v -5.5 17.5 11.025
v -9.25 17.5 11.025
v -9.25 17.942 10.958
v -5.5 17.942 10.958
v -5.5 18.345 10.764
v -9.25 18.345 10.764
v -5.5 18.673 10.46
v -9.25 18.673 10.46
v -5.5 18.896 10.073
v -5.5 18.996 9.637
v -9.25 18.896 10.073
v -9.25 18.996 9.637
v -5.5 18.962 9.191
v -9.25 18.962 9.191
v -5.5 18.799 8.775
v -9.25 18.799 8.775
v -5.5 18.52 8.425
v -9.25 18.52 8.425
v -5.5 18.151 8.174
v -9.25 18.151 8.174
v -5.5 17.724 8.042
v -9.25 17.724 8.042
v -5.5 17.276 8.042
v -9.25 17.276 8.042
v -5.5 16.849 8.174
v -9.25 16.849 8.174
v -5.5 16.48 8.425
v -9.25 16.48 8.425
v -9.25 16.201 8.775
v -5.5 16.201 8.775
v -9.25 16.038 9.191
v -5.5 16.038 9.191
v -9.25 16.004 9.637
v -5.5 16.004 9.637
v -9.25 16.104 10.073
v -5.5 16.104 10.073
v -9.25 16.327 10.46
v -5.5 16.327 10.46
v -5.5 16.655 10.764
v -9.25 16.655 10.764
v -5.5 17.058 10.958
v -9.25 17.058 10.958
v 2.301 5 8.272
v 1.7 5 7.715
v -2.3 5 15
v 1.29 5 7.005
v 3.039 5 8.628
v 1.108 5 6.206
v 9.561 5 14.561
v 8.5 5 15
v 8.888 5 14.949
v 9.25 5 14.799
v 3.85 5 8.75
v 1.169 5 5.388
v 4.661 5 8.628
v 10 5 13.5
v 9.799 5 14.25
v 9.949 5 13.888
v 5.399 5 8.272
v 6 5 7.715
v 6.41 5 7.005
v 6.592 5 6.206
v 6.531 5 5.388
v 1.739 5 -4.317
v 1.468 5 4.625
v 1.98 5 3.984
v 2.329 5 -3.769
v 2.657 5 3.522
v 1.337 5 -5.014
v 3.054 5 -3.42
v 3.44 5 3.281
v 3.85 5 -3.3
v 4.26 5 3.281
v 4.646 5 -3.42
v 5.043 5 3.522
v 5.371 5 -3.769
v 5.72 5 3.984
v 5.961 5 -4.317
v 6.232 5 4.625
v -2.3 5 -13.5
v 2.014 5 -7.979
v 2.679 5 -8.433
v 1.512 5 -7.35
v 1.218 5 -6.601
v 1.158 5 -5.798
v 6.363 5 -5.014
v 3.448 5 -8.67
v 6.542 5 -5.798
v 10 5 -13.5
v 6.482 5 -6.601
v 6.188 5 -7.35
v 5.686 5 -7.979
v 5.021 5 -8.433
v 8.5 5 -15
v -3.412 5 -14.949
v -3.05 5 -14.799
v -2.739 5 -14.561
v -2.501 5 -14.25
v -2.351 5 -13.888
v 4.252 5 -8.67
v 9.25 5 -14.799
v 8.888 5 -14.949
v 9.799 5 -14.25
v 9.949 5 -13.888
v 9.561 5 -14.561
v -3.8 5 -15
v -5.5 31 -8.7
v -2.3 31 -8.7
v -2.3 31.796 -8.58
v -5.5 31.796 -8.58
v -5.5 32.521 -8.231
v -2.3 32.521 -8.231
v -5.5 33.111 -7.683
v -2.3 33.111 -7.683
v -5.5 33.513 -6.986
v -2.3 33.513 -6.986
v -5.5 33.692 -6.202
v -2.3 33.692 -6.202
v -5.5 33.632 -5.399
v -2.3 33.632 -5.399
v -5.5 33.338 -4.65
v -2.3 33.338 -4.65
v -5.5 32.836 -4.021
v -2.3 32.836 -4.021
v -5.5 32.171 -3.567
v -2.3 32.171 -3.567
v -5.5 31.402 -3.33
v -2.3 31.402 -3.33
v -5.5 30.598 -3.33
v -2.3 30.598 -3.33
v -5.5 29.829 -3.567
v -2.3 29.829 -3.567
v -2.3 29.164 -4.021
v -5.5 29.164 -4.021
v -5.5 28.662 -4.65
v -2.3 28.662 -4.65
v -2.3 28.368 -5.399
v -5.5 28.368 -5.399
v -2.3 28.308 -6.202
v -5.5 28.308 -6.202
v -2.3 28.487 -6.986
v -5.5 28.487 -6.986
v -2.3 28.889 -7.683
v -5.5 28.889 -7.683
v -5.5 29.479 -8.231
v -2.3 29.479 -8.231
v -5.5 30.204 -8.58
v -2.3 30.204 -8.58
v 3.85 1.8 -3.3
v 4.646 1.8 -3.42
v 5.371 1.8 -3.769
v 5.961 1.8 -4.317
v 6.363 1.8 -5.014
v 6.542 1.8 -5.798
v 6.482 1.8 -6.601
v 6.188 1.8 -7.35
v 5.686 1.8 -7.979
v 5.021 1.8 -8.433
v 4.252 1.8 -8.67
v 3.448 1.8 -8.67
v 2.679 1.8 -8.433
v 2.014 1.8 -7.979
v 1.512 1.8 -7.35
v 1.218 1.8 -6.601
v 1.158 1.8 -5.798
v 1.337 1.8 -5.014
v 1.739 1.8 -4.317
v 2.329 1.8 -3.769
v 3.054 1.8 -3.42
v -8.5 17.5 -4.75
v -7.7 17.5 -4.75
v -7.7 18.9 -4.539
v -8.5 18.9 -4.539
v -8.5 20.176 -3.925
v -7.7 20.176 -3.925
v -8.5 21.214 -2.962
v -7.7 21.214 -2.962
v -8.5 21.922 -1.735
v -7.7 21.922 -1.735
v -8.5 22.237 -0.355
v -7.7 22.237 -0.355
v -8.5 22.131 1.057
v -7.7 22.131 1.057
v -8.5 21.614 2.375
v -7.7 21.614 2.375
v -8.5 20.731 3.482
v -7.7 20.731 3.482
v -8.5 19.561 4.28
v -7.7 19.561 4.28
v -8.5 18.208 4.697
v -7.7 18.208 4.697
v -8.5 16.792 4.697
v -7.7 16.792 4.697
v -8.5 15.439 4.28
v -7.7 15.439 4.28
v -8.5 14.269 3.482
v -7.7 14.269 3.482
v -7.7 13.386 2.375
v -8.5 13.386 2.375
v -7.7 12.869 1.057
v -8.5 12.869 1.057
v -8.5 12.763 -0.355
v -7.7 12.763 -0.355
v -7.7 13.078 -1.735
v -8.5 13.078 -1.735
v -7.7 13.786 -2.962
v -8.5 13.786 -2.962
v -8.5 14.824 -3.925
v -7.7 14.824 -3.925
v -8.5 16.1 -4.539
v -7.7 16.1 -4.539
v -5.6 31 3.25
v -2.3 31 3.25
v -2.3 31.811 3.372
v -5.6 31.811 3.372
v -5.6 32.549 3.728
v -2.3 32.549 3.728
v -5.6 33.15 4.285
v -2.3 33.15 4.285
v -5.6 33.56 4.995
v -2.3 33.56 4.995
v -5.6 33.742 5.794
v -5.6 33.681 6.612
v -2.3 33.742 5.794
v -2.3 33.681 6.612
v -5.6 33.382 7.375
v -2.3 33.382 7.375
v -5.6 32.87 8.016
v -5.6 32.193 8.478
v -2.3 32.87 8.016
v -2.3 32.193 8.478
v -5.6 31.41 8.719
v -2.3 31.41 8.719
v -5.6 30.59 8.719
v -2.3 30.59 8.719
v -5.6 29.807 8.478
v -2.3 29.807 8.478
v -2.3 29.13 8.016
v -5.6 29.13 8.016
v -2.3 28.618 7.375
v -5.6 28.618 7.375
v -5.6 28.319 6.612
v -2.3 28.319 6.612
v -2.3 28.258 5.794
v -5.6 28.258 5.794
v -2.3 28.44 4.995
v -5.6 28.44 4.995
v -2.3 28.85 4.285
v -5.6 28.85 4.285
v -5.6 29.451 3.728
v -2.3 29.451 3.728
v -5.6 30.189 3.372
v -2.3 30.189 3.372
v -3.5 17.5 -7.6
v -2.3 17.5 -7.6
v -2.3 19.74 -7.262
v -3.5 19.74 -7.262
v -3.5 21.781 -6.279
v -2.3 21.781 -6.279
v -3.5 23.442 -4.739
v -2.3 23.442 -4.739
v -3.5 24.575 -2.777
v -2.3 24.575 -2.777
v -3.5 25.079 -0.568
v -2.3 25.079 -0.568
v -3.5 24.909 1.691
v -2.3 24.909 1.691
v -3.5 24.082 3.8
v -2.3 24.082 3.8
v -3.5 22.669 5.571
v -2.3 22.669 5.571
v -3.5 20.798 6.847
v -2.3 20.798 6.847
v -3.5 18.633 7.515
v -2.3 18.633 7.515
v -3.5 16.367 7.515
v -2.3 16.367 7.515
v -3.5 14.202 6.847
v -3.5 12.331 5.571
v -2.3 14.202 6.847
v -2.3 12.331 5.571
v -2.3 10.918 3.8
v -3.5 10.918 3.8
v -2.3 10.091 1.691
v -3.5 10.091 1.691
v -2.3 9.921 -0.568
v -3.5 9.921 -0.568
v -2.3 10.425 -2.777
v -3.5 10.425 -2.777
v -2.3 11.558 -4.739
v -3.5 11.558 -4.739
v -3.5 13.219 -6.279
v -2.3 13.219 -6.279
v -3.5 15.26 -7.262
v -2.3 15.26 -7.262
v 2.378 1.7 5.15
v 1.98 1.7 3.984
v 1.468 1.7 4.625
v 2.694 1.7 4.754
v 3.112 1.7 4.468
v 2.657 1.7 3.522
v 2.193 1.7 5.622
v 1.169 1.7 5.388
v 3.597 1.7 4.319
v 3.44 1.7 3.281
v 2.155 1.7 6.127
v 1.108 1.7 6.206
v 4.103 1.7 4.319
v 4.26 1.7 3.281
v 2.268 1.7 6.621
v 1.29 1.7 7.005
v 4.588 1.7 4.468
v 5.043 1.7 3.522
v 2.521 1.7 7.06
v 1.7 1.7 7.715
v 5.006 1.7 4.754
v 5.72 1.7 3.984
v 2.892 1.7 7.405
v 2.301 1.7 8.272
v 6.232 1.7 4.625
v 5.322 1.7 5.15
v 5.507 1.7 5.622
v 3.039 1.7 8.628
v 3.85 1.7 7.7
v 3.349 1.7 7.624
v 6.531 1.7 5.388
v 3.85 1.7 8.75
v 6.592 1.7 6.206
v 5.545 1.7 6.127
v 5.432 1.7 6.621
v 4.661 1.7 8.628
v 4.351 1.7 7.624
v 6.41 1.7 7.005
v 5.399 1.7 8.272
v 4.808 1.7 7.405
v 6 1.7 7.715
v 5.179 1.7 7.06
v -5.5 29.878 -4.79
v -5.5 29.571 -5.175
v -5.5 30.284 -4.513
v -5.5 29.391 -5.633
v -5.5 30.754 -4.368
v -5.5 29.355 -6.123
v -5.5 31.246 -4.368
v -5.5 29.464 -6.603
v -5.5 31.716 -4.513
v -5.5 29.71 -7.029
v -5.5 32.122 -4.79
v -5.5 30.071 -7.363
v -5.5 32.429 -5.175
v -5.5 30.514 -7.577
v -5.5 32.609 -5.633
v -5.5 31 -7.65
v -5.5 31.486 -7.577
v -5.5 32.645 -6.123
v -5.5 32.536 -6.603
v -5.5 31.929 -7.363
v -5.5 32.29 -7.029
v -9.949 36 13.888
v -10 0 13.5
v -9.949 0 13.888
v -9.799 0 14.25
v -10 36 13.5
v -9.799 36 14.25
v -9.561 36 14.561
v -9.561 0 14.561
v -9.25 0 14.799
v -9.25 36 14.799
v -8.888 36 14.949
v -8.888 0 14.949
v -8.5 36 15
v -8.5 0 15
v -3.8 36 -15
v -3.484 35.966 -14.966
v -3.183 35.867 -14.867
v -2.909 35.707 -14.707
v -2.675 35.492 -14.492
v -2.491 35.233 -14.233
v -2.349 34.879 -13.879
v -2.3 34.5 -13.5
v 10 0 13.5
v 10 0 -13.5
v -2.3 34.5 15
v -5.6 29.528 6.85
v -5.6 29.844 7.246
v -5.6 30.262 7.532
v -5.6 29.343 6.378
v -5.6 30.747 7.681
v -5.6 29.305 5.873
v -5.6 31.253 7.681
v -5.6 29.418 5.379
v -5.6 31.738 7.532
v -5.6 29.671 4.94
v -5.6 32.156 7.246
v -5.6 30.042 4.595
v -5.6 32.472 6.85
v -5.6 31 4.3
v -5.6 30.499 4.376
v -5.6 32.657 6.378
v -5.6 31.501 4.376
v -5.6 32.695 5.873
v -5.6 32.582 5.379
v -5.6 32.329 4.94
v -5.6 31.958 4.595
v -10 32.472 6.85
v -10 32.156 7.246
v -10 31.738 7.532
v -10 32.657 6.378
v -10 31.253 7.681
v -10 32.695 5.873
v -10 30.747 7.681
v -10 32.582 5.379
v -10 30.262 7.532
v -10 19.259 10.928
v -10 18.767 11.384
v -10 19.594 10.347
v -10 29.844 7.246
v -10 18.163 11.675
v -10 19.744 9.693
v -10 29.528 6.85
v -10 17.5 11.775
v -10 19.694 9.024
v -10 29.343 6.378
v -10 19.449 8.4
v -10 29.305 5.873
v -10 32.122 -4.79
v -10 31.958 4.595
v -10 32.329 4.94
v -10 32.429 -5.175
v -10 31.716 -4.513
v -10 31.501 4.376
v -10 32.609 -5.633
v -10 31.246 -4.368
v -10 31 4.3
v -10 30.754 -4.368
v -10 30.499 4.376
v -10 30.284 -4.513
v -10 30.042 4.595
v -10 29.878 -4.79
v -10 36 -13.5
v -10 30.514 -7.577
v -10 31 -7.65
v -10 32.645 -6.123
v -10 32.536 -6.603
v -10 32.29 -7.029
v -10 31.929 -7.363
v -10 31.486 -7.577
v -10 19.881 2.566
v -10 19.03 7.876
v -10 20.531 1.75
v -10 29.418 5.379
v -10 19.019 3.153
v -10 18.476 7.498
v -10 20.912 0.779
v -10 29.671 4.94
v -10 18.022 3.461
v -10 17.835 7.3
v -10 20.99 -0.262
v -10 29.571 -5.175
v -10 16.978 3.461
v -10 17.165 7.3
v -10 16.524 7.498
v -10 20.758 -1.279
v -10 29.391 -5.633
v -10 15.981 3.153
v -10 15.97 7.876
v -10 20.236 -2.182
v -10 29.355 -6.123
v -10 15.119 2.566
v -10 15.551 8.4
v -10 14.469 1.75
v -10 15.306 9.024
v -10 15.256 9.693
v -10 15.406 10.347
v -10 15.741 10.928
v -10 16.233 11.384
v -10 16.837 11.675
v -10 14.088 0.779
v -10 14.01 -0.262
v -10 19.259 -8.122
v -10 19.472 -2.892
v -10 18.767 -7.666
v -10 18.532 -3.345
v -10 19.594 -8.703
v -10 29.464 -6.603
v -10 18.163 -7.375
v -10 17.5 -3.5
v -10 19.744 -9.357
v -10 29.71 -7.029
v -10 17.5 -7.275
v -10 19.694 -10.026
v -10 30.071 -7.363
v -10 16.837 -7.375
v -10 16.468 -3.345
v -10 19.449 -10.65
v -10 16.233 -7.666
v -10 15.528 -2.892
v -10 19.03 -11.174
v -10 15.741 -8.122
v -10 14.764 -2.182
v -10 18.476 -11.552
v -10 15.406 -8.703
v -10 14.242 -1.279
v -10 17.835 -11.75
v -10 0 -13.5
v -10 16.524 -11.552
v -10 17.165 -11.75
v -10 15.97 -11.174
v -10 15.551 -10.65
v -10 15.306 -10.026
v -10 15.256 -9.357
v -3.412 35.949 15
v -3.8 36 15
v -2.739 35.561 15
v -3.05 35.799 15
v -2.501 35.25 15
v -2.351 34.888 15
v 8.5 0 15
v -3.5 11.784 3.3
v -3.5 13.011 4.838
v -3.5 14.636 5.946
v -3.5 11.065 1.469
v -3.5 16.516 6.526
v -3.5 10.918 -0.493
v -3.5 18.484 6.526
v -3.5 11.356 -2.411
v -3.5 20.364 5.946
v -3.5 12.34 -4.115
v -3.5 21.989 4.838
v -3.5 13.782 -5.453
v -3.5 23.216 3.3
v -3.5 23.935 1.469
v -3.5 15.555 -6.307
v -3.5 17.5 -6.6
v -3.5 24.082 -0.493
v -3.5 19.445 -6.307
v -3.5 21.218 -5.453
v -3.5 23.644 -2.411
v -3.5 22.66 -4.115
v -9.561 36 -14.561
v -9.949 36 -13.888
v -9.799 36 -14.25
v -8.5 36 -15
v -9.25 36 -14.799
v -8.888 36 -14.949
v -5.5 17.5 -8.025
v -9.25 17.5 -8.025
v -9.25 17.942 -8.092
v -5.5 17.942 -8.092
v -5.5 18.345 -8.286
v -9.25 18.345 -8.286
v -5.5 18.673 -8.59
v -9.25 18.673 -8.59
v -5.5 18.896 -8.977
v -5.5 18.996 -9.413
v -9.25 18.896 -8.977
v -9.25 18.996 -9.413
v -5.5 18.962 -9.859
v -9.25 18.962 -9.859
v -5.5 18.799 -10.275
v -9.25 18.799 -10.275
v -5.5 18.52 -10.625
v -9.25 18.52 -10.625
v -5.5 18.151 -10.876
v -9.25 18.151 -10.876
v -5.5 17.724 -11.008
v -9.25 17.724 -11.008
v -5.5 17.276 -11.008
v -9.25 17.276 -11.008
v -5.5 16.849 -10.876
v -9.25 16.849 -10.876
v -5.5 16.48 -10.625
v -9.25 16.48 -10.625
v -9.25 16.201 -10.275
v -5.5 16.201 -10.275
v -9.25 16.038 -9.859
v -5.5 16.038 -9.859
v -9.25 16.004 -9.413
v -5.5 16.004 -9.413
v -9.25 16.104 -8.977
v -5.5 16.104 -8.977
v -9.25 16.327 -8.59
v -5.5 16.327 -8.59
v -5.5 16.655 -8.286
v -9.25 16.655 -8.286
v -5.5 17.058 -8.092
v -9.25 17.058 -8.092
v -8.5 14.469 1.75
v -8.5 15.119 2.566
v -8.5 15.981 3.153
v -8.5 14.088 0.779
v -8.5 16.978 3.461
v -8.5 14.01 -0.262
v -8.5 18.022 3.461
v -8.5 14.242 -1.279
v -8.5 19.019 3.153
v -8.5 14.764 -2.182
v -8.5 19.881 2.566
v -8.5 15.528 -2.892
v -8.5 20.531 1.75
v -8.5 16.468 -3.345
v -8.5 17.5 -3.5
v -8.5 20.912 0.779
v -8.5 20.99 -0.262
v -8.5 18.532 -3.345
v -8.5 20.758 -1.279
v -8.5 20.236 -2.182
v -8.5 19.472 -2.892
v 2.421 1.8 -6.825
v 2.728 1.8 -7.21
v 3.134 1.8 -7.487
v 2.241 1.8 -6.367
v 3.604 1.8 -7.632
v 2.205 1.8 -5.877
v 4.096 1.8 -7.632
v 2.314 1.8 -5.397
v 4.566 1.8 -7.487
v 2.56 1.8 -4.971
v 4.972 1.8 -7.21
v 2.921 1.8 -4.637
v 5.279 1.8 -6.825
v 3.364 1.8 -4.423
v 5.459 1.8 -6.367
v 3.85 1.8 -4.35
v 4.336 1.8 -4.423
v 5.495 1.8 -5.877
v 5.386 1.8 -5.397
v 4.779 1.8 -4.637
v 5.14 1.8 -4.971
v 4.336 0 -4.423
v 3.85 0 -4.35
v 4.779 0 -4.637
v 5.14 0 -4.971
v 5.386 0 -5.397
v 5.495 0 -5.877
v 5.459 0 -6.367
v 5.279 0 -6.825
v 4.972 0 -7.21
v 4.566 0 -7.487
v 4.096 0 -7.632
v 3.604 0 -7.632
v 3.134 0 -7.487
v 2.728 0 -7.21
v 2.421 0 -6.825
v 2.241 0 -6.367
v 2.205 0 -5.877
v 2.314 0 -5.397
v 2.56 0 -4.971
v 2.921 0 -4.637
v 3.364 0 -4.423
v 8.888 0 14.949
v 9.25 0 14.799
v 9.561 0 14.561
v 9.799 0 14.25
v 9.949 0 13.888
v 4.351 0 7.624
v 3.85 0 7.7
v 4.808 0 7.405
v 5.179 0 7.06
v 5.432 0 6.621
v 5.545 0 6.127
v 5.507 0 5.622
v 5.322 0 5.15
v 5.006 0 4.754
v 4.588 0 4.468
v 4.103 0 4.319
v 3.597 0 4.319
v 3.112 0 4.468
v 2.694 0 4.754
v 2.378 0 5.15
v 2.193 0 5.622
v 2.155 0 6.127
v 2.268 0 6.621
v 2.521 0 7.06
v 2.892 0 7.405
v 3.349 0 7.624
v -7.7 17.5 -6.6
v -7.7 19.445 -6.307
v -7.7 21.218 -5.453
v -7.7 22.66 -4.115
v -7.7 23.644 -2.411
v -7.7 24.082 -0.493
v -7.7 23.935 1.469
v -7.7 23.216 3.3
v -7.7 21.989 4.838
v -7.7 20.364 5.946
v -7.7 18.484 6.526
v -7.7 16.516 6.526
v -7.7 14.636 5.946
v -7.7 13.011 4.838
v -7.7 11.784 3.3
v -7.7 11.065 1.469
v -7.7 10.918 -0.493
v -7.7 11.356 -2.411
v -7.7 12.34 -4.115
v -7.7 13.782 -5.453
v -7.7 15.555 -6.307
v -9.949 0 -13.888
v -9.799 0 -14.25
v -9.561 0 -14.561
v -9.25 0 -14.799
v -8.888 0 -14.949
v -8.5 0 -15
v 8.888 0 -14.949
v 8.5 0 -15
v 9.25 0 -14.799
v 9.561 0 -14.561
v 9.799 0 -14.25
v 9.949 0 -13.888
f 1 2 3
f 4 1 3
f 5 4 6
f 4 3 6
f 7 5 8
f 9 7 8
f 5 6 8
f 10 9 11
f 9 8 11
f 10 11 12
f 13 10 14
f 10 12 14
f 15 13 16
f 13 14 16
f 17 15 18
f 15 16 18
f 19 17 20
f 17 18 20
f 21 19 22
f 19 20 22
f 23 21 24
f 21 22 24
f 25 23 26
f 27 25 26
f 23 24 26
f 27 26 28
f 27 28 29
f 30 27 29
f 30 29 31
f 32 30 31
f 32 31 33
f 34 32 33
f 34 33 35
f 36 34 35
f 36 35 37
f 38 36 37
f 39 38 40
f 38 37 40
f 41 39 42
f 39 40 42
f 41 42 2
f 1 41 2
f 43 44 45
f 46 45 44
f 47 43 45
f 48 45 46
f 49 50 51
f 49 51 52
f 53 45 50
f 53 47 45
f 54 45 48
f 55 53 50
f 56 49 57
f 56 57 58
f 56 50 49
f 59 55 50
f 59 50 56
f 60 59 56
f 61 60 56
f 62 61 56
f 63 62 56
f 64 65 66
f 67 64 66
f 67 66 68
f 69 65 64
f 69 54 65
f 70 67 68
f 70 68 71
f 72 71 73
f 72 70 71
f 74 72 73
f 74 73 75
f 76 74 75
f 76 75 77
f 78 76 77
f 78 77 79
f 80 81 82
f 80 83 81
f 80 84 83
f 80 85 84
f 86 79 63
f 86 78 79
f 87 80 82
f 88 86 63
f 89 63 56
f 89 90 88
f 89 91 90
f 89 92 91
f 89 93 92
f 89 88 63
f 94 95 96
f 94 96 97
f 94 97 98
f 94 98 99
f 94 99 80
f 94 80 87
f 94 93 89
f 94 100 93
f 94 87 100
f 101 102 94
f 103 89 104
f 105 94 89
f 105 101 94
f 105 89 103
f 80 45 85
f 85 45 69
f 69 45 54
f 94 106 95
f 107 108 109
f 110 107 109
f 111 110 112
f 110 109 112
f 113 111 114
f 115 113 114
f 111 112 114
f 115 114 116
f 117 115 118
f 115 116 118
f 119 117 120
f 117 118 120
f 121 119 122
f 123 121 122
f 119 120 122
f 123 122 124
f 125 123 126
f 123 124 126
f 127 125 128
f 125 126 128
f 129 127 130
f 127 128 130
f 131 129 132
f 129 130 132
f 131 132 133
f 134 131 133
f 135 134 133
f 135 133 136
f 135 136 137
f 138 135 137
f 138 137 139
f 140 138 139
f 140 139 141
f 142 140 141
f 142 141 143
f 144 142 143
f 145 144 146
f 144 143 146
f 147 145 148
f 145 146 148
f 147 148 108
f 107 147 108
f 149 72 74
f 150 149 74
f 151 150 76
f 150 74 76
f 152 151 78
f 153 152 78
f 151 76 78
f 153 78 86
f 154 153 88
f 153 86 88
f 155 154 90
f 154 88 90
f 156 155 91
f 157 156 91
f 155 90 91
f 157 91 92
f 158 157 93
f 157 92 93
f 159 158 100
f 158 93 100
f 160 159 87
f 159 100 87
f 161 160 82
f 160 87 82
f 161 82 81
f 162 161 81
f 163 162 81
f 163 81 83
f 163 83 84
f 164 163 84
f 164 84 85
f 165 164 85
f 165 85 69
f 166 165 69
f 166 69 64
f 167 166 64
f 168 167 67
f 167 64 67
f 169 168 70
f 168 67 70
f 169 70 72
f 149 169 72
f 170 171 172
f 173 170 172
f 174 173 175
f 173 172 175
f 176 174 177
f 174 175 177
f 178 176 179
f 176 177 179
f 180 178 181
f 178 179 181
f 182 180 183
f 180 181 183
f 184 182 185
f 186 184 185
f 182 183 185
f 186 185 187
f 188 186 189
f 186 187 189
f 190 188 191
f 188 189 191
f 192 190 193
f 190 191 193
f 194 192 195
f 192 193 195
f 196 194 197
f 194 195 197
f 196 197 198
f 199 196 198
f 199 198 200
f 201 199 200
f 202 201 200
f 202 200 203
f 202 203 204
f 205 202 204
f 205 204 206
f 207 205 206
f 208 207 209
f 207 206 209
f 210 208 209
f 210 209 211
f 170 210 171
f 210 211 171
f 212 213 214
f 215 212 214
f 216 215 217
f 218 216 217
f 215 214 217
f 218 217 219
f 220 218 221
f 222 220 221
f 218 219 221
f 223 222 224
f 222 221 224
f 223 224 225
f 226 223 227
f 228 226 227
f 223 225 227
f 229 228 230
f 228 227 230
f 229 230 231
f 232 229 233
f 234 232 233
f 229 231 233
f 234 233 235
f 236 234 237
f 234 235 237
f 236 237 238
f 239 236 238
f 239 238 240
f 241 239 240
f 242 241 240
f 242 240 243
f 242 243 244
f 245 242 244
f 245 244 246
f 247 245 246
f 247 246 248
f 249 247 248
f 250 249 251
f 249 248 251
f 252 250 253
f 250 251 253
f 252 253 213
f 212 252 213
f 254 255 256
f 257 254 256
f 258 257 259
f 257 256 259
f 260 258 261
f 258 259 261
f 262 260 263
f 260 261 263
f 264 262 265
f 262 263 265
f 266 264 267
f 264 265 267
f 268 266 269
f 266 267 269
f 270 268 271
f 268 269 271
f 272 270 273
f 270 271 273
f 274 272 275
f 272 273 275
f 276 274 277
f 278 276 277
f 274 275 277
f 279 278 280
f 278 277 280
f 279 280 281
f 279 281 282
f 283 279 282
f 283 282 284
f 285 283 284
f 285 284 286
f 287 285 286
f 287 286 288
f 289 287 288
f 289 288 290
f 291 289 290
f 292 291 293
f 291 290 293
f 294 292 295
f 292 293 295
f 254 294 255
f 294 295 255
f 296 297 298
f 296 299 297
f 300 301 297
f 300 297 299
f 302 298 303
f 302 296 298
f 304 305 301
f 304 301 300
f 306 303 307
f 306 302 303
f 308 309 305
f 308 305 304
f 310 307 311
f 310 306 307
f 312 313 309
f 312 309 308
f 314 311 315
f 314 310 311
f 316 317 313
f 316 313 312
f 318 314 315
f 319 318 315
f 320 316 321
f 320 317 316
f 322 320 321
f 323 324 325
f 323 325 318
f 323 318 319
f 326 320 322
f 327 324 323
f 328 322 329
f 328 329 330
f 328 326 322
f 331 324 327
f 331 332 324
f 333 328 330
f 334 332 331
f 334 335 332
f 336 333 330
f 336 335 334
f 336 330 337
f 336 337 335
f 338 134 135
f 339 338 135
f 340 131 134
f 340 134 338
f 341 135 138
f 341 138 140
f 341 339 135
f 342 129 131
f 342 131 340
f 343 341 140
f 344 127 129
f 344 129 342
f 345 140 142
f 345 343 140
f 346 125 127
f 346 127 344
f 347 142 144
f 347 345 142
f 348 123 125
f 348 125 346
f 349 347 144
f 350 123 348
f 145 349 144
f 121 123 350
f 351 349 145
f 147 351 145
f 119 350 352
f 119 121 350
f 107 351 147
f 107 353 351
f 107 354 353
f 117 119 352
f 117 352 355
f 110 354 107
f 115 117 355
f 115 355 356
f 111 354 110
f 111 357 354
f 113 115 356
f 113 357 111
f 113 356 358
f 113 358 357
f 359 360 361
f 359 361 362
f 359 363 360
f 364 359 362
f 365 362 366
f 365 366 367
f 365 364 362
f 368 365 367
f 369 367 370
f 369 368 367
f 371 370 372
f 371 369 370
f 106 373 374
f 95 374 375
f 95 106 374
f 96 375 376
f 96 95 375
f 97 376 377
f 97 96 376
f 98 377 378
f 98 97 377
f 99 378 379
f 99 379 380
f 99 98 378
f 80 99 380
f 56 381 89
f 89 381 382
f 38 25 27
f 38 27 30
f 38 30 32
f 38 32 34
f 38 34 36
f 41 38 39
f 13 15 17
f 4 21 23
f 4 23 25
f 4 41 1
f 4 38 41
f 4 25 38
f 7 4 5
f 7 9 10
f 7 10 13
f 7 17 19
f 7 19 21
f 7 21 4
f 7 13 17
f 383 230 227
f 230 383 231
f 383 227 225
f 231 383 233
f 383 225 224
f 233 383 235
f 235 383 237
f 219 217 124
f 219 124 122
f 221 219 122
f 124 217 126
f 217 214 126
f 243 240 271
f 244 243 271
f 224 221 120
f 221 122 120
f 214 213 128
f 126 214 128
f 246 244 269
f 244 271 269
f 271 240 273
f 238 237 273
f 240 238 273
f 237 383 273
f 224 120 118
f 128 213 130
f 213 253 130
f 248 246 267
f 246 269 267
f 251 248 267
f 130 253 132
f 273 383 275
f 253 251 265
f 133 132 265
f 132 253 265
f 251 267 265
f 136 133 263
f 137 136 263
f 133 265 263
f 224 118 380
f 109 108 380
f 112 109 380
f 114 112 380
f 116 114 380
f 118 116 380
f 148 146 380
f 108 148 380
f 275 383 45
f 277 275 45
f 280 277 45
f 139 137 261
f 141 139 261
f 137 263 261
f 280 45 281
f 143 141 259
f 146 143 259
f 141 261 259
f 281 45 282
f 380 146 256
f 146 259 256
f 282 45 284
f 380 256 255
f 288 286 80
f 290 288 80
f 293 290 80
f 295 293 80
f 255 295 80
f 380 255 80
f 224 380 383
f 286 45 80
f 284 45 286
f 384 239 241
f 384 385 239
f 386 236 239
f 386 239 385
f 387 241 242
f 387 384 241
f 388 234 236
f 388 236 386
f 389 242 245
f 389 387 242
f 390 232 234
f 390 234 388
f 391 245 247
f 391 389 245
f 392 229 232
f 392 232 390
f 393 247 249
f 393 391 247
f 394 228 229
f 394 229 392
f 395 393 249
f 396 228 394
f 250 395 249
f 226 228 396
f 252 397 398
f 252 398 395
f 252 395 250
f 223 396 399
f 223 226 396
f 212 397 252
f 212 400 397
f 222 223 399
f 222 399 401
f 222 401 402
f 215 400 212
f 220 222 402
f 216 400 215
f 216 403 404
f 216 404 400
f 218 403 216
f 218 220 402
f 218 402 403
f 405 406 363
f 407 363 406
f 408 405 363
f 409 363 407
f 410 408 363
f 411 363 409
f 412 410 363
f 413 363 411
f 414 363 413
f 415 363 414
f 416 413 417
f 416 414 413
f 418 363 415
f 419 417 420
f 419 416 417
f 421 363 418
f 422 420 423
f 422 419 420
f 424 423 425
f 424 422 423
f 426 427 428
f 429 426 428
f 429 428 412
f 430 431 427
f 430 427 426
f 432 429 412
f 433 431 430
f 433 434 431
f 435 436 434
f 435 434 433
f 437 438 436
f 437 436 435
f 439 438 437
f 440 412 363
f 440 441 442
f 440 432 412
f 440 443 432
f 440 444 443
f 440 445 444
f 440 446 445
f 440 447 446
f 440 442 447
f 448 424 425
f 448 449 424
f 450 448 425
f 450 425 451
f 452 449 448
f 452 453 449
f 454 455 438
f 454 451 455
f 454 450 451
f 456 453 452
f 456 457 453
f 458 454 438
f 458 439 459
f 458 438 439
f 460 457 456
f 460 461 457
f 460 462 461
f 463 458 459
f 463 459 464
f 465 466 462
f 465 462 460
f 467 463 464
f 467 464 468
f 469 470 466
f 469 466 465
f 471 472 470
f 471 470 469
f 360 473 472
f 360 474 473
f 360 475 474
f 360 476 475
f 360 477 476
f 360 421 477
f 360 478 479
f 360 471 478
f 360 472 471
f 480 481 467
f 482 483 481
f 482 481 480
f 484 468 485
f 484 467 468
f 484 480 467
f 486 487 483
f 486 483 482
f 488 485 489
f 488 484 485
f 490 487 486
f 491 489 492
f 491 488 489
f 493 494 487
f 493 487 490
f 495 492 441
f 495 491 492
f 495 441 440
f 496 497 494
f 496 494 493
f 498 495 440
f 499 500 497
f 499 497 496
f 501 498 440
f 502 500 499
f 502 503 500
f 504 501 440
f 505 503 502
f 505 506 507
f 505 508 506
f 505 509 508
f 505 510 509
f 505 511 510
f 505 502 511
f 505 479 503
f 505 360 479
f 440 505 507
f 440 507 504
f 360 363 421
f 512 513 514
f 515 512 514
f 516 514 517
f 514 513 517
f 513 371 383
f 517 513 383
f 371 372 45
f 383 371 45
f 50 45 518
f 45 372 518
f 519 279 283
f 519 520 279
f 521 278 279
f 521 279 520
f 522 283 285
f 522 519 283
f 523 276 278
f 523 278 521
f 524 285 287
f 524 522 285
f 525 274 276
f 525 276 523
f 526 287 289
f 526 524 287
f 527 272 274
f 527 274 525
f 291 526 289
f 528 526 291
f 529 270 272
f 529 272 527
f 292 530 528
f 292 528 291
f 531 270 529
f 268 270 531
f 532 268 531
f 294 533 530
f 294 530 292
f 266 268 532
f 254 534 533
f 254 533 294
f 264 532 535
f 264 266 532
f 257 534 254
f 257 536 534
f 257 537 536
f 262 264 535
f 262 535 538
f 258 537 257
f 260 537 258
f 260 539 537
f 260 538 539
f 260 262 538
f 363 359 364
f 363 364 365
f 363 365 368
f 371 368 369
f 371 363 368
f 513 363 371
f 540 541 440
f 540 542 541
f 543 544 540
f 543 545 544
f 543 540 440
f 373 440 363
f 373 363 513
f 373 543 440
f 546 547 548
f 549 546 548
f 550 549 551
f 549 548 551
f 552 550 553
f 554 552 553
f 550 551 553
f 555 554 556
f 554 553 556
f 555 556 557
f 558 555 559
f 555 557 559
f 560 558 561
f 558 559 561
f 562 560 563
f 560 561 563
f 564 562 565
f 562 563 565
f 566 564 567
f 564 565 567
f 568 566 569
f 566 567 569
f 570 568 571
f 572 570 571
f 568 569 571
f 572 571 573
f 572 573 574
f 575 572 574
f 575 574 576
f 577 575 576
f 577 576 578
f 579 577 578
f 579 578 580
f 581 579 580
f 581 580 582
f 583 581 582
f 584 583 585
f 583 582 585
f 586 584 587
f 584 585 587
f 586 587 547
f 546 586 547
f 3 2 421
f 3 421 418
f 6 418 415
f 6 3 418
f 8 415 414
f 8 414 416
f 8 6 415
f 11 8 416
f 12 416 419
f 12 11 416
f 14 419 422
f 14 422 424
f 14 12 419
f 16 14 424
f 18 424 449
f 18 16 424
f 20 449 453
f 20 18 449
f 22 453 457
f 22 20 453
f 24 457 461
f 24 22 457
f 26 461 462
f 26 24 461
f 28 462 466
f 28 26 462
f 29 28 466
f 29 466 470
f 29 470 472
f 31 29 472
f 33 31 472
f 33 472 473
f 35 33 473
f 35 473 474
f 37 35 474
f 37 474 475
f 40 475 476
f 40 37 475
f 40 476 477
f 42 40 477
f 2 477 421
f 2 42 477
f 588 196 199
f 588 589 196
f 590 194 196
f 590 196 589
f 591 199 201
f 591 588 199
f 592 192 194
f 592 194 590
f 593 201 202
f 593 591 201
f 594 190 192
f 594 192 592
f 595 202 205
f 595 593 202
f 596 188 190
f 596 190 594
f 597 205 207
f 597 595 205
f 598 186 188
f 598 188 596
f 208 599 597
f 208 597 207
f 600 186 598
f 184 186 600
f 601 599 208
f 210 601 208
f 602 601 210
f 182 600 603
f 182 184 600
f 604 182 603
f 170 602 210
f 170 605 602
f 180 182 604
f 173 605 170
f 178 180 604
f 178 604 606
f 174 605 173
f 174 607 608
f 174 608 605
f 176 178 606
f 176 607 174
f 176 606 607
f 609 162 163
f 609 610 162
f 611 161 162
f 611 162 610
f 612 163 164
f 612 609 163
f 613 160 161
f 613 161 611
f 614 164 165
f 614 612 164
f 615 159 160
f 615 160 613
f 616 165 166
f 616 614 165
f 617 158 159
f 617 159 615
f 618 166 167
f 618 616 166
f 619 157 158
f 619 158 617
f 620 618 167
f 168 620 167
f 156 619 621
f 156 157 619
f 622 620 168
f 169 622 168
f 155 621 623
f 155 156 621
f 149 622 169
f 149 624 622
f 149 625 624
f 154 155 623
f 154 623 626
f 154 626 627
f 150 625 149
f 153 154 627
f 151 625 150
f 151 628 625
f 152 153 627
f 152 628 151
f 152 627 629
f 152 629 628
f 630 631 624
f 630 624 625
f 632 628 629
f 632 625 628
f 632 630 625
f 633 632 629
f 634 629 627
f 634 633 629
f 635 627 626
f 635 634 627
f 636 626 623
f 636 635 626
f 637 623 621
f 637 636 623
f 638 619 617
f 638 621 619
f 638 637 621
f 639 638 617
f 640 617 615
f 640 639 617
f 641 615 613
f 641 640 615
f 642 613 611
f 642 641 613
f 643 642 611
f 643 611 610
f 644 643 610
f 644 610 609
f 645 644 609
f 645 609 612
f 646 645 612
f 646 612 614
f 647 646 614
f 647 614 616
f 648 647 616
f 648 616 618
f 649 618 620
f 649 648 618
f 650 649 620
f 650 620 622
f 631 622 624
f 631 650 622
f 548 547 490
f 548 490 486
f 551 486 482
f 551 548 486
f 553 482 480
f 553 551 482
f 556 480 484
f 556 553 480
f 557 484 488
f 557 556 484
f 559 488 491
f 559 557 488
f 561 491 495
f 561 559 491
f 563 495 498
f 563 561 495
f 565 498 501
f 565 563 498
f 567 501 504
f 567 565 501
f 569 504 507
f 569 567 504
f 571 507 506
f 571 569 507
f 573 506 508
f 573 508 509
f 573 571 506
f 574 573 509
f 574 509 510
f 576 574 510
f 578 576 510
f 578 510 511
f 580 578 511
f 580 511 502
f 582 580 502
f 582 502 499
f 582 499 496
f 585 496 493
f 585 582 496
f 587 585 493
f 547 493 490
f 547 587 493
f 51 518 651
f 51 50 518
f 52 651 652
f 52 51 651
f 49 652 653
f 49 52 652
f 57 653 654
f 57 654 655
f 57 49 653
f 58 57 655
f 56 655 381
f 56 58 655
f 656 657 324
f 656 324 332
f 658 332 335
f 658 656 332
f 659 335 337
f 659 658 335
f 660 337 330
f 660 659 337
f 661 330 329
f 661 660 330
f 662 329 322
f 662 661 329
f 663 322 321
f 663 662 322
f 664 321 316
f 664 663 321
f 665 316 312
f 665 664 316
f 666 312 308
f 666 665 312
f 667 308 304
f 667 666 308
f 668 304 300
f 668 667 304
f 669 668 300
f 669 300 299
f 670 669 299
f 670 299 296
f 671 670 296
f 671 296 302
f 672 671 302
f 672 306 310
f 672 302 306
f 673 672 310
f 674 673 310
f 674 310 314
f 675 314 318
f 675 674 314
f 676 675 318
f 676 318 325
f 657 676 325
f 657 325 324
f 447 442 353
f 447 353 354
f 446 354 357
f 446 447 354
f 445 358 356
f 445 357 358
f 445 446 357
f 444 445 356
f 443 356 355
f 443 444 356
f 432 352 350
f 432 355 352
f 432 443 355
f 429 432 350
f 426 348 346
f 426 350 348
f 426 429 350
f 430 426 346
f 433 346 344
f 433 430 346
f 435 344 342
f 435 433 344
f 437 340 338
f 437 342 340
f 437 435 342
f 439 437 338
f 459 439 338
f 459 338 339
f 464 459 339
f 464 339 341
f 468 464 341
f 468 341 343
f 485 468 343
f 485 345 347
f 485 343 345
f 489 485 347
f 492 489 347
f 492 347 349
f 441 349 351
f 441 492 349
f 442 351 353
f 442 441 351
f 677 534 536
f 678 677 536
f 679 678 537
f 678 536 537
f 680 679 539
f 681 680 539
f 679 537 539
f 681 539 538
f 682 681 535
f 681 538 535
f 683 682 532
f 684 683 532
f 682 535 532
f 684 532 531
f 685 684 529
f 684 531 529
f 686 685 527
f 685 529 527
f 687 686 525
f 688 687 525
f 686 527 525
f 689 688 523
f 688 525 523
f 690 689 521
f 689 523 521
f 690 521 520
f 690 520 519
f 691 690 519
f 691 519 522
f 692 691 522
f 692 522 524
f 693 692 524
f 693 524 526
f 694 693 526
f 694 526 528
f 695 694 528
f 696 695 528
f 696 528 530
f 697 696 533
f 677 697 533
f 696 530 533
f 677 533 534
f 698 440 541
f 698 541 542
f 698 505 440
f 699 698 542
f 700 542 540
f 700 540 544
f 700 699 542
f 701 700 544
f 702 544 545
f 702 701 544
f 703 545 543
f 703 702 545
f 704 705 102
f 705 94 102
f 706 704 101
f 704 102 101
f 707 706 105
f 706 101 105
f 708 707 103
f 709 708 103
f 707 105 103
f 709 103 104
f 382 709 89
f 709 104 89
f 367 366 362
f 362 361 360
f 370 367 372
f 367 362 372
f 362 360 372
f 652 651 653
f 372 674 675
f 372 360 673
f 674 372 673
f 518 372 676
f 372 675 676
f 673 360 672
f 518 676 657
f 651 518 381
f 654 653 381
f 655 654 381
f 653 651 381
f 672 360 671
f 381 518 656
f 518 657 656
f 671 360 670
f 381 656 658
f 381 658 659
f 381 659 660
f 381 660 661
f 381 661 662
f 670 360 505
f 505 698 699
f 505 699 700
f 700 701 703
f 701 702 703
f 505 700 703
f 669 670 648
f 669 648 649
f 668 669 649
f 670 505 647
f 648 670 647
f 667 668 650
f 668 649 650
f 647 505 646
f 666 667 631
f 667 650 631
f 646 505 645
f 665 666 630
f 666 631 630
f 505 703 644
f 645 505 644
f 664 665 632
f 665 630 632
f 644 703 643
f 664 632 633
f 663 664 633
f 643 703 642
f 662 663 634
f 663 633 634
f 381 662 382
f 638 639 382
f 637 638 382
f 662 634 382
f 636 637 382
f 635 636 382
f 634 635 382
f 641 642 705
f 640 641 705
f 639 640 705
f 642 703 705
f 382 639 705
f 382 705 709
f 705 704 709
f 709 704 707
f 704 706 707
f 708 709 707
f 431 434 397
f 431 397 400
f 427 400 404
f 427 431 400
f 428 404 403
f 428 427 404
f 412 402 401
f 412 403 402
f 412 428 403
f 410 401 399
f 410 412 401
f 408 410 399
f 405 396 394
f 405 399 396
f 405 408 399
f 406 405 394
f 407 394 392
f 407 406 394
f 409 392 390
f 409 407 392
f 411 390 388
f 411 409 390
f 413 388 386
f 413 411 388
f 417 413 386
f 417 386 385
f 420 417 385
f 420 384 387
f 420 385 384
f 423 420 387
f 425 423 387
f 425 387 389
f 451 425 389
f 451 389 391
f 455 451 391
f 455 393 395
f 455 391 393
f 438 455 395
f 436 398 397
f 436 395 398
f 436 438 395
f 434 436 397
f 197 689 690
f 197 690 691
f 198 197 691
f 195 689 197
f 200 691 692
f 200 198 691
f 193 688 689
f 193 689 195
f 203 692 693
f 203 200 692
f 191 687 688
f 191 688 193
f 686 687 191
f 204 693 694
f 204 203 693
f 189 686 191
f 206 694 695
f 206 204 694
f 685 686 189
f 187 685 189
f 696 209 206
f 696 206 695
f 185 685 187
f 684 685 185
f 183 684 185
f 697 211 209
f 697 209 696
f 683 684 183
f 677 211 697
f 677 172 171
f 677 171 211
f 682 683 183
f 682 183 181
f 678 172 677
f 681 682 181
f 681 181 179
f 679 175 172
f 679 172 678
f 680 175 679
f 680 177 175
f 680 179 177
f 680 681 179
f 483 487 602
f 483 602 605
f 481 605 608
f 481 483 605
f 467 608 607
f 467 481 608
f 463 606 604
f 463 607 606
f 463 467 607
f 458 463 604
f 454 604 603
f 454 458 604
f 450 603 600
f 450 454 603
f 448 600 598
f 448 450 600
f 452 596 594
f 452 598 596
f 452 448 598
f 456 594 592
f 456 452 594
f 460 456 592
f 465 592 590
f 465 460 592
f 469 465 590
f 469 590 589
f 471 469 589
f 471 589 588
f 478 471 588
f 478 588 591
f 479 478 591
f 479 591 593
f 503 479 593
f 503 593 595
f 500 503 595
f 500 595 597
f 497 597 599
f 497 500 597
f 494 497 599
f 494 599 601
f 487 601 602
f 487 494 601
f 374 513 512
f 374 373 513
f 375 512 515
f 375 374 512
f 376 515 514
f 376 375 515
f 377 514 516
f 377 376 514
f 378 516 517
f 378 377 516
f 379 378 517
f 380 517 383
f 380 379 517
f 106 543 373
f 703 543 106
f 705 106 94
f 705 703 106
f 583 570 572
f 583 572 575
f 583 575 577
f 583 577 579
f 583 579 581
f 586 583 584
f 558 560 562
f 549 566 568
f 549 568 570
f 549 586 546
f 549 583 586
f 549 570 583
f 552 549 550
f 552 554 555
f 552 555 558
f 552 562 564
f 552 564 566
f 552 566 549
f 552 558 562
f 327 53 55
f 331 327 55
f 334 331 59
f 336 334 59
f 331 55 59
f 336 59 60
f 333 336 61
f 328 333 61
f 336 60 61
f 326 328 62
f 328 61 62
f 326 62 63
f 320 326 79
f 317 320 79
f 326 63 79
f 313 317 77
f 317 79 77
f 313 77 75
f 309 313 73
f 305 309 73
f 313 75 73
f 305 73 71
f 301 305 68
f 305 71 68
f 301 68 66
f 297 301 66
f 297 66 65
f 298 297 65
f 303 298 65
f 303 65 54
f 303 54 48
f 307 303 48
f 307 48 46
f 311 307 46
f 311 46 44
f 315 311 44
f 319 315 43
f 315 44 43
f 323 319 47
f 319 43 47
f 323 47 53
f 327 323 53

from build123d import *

# Parameters (mm, degrees)
SKETCH1_W               = 20
SKETCH1_H               = 30
BOSS_EXTRUDE1_DEPTH     = 5
SKETCH2_W               = 7.7
SKETCH2_H               = 30
BOSS_EXTRUDE2_DEPTH     = 25
CUT_EXTRUDE1_DEPTH      = 36.725201189
CUT_EXTRUDE1_DEPTH_BACK = 36.725201189
SKETCH3_R               = 3.5
SKETCH4_R               = 7.6
CUT_EXTRUDE2_DEPTH      = 1.2
SKETCH5_R               = 6.6
CUT_EXTRUDE3_DEPTH      = 4.2
SKETCH6_R               = 4.75
CUT_EXTRUDE4_DEPTH      = 0.8
CUT_EXTRUDE5_DEPTH      = 31.822070015
CUT_EXTRUDE5_DEPTH_BACK = 31.822070015
SKETCH7_R               = 1.65
SKETCH7_R_2             = 1.7
SKETCH8_R               = 2.7
CUT_EXTRUDE6_DEPTH      = 3.2
SKETCH9_R               = 2.75
CUT_EXTRUDE7_DEPTH      = 3.3
SKETCH10_W              = 7.7
SKETCH10_H              = 30
BOSS_EXTRUDE3_DEPTH     = 6
CUT_EXTRUDE8_DEPTH      = 41.893642538
CUT_EXTRUDE8_DEPTH_BACK = 41.893642538
SKETCH11_R              = 1.7
SKETCH11_R_2            = 1.65
SKETCH12_R              = 2.7
CUT_EXTRUDE9_DEPTH      = 3.2
SKETCH13_R              = 2.75
CUT_EXTRUDE10_DEPTH     = 3.3
SKETCH14_R              = 1.5
CUT_EXTRUDE11_DEPTH     = 4.5
CHAMFER1_SIZE           = 0.75
FILLET1_R               = 1.5


with BuildPart() as part:
    # Sketch1 → Boss-Extrude1 (new body)
    with BuildSketch(Plane(origin=(0, 0, 0), x_dir=(1, 0, 0), z_dir=(0, 1, 0))):
        Rectangle(SKETCH1_W, SKETCH1_H)
    extrude(amount=BOSS_EXTRUDE1_DEPTH)

    # Sketch2 → Boss-Extrude2 (add)
    with BuildSketch(Plane(origin=(0, 5, 0), x_dir=(1, 0, 0), z_dir=(0, 1, 0))):
        with Locations((-6.15, 0)):
            Rectangle(SKETCH2_W, SKETCH2_H)
    extrude(amount=BOSS_EXTRUDE2_DEPTH)

    # Sketch3 → Cut-Extrude1 (cut, two sides: drawn at the far end of the back side and taken through both)
    with BuildSketch(Plane(origin=(-2.3, 0, 0), x_dir=(0, 0, -1), z_dir=(1, 0, 0)).offset(-CUT_EXTRUDE1_DEPTH_BACK)):
        with Locations((0, 17.5)):
            Circle(SKETCH3_R)
    extrude(amount=CUT_EXTRUDE1_DEPTH + CUT_EXTRUDE1_DEPTH_BACK, mode=Mode.SUBTRACT)

    # Sketch4 → Cut-Extrude2 (cut)
    with BuildSketch(Plane(origin=(-2.3, 0, 0), x_dir=(0, 0, -1), z_dir=(1, 0, 0))):
        with Locations((0, 17.5)):
            Circle(SKETCH4_R)
    extrude(amount=-CUT_EXTRUDE2_DEPTH, mode=Mode.SUBTRACT)

    # Sketch5 → Cut-Extrude3 (cut)
    with BuildSketch(Plane(origin=(-3.5, 0, 0), x_dir=(0, 0, -1), z_dir=(1, 0, 0))):
        with Locations((0, 17.5)):
            Circle(SKETCH5_R)
    extrude(amount=-CUT_EXTRUDE3_DEPTH, mode=Mode.SUBTRACT)

    # Sketch6 → Cut-Extrude4 (cut)
    with BuildSketch(Plane(origin=(-7.7, 0, 0), x_dir=(0, 0, -1), z_dir=(1, 0, 0))):
        with Locations((0, 17.5)):
            Circle(SKETCH6_R)
    extrude(amount=-CUT_EXTRUDE4_DEPTH, mode=Mode.SUBTRACT)

    # Sketch7 → Cut-Extrude5 (cut, two sides: drawn at the far end of the back side and taken through both)
    with BuildSketch(Plane(origin=(0, 5, 0), x_dir=(1, 0, 0), z_dir=(0, 1, 0)).offset(-CUT_EXTRUDE5_DEPTH_BACK)):
        with Locations(Location((3.85, 6, 0), (0, 0, 270))):
            Circle(SKETCH7_R)
        with Locations(Location((3.85, -6, 0), (0, 0, 270))):
            Circle(SKETCH7_R_2)
    extrude(amount=CUT_EXTRUDE5_DEPTH + CUT_EXTRUDE5_DEPTH_BACK, mode=Mode.SUBTRACT)

    # Sketch8 → Cut-Extrude6 (cut)
    with BuildSketch(Plane(origin=(0, 5, 0), x_dir=(1, 0, 0), z_dir=(0, 1, 0))):
        with Locations(Location((3.85, 6, 0), (0, 0, 270))):
            Circle(SKETCH8_R)
    extrude(amount=-CUT_EXTRUDE6_DEPTH, mode=Mode.SUBTRACT)

    # Sketch9 → Cut-Extrude7 (cut)
    with BuildSketch(Plane(origin=(0, 5, 0), x_dir=(1, 0, 0), z_dir=(0, 1, 0))):
        with Locations(Location((3.85, -6, 0), (0, 0, 270))):
            Circle(SKETCH9_R)
    extrude(amount=-CUT_EXTRUDE7_DEPTH, mode=Mode.SUBTRACT)

    # Sketch10 → Boss-Extrude3 (add)
    with BuildSketch(Plane(origin=(0, 30, 0), x_dir=(1, 0, 0), z_dir=(0, 1, 0))):
        with Locations((-6.15, 0)):
            Rectangle(SKETCH10_W, SKETCH10_H)
    extrude(amount=BOSS_EXTRUDE3_DEPTH)

    # Sketch11 → Cut-Extrude8 (cut, two sides: drawn at the far end of the back side and taken through both)
    with BuildSketch(Plane(origin=(-2.3, 0, 0), x_dir=(0, 0, -1), z_dir=(1, 0, 0)).offset(-CUT_EXTRUDE8_DEPTH_BACK)):
        with Locations((-6, 31)):
            Circle(SKETCH11_R)
        with Locations((6, 31)):
            Circle(SKETCH11_R_2)
    extrude(amount=CUT_EXTRUDE8_DEPTH + CUT_EXTRUDE8_DEPTH_BACK, mode=Mode.SUBTRACT)

    # Sketch12 → Cut-Extrude9 (cut)
    with BuildSketch(Plane(origin=(-2.3, 0, 0), x_dir=(0, 0, -1), z_dir=(1, 0, 0))):
        with Locations((6, 31)):
            Circle(SKETCH12_R)
    extrude(amount=-CUT_EXTRUDE9_DEPTH, mode=Mode.SUBTRACT)

    # Sketch13 → Cut-Extrude10 (cut)
    with BuildSketch(Plane(origin=(-2.3, 0, 0), x_dir=(0, 0, -1), z_dir=(1, 0, 0))):
        with Locations((-6, 31)):
            Circle(SKETCH13_R)
    extrude(amount=-CUT_EXTRUDE10_DEPTH, mode=Mode.SUBTRACT)

    # Sketch14 → Cut-Extrude11 (cut)
    with BuildSketch(Plane.ZY.offset(10)):
        with Locations((-9.525, 17.5)):
            Circle(SKETCH14_R)
        with Locations((9.525, 17.5)):
            Circle(SKETCH14_R)
    extrude(amount=-CUT_EXTRUDE11_DEPTH, mode=Mode.SUBTRACT)

    # Chamfer1
    chamfer1_edges = [part.edges().sort_by_distance(p)[0] for p in [
        (-10, 17.5, -11.025),
        (-10, 17.5, 8.025),
    ]]
    chamfer(chamfer1_edges, length=CHAMFER1_SIZE)

    # Fillet1
    fillet1_edges = [part.edges().sort_by_distance(p)[0] for p in [
        (-2.3, 20.5, -15),
        (10, 2.5, 15),
        (-10, 18, 15),
        (-10, 18, -15),
        (-2.3, 36, 0),
        (10, 2.5, -15),
    ]]
    fillet(fillet1_edges, radius=FILLET1_R)


solid = part.part
